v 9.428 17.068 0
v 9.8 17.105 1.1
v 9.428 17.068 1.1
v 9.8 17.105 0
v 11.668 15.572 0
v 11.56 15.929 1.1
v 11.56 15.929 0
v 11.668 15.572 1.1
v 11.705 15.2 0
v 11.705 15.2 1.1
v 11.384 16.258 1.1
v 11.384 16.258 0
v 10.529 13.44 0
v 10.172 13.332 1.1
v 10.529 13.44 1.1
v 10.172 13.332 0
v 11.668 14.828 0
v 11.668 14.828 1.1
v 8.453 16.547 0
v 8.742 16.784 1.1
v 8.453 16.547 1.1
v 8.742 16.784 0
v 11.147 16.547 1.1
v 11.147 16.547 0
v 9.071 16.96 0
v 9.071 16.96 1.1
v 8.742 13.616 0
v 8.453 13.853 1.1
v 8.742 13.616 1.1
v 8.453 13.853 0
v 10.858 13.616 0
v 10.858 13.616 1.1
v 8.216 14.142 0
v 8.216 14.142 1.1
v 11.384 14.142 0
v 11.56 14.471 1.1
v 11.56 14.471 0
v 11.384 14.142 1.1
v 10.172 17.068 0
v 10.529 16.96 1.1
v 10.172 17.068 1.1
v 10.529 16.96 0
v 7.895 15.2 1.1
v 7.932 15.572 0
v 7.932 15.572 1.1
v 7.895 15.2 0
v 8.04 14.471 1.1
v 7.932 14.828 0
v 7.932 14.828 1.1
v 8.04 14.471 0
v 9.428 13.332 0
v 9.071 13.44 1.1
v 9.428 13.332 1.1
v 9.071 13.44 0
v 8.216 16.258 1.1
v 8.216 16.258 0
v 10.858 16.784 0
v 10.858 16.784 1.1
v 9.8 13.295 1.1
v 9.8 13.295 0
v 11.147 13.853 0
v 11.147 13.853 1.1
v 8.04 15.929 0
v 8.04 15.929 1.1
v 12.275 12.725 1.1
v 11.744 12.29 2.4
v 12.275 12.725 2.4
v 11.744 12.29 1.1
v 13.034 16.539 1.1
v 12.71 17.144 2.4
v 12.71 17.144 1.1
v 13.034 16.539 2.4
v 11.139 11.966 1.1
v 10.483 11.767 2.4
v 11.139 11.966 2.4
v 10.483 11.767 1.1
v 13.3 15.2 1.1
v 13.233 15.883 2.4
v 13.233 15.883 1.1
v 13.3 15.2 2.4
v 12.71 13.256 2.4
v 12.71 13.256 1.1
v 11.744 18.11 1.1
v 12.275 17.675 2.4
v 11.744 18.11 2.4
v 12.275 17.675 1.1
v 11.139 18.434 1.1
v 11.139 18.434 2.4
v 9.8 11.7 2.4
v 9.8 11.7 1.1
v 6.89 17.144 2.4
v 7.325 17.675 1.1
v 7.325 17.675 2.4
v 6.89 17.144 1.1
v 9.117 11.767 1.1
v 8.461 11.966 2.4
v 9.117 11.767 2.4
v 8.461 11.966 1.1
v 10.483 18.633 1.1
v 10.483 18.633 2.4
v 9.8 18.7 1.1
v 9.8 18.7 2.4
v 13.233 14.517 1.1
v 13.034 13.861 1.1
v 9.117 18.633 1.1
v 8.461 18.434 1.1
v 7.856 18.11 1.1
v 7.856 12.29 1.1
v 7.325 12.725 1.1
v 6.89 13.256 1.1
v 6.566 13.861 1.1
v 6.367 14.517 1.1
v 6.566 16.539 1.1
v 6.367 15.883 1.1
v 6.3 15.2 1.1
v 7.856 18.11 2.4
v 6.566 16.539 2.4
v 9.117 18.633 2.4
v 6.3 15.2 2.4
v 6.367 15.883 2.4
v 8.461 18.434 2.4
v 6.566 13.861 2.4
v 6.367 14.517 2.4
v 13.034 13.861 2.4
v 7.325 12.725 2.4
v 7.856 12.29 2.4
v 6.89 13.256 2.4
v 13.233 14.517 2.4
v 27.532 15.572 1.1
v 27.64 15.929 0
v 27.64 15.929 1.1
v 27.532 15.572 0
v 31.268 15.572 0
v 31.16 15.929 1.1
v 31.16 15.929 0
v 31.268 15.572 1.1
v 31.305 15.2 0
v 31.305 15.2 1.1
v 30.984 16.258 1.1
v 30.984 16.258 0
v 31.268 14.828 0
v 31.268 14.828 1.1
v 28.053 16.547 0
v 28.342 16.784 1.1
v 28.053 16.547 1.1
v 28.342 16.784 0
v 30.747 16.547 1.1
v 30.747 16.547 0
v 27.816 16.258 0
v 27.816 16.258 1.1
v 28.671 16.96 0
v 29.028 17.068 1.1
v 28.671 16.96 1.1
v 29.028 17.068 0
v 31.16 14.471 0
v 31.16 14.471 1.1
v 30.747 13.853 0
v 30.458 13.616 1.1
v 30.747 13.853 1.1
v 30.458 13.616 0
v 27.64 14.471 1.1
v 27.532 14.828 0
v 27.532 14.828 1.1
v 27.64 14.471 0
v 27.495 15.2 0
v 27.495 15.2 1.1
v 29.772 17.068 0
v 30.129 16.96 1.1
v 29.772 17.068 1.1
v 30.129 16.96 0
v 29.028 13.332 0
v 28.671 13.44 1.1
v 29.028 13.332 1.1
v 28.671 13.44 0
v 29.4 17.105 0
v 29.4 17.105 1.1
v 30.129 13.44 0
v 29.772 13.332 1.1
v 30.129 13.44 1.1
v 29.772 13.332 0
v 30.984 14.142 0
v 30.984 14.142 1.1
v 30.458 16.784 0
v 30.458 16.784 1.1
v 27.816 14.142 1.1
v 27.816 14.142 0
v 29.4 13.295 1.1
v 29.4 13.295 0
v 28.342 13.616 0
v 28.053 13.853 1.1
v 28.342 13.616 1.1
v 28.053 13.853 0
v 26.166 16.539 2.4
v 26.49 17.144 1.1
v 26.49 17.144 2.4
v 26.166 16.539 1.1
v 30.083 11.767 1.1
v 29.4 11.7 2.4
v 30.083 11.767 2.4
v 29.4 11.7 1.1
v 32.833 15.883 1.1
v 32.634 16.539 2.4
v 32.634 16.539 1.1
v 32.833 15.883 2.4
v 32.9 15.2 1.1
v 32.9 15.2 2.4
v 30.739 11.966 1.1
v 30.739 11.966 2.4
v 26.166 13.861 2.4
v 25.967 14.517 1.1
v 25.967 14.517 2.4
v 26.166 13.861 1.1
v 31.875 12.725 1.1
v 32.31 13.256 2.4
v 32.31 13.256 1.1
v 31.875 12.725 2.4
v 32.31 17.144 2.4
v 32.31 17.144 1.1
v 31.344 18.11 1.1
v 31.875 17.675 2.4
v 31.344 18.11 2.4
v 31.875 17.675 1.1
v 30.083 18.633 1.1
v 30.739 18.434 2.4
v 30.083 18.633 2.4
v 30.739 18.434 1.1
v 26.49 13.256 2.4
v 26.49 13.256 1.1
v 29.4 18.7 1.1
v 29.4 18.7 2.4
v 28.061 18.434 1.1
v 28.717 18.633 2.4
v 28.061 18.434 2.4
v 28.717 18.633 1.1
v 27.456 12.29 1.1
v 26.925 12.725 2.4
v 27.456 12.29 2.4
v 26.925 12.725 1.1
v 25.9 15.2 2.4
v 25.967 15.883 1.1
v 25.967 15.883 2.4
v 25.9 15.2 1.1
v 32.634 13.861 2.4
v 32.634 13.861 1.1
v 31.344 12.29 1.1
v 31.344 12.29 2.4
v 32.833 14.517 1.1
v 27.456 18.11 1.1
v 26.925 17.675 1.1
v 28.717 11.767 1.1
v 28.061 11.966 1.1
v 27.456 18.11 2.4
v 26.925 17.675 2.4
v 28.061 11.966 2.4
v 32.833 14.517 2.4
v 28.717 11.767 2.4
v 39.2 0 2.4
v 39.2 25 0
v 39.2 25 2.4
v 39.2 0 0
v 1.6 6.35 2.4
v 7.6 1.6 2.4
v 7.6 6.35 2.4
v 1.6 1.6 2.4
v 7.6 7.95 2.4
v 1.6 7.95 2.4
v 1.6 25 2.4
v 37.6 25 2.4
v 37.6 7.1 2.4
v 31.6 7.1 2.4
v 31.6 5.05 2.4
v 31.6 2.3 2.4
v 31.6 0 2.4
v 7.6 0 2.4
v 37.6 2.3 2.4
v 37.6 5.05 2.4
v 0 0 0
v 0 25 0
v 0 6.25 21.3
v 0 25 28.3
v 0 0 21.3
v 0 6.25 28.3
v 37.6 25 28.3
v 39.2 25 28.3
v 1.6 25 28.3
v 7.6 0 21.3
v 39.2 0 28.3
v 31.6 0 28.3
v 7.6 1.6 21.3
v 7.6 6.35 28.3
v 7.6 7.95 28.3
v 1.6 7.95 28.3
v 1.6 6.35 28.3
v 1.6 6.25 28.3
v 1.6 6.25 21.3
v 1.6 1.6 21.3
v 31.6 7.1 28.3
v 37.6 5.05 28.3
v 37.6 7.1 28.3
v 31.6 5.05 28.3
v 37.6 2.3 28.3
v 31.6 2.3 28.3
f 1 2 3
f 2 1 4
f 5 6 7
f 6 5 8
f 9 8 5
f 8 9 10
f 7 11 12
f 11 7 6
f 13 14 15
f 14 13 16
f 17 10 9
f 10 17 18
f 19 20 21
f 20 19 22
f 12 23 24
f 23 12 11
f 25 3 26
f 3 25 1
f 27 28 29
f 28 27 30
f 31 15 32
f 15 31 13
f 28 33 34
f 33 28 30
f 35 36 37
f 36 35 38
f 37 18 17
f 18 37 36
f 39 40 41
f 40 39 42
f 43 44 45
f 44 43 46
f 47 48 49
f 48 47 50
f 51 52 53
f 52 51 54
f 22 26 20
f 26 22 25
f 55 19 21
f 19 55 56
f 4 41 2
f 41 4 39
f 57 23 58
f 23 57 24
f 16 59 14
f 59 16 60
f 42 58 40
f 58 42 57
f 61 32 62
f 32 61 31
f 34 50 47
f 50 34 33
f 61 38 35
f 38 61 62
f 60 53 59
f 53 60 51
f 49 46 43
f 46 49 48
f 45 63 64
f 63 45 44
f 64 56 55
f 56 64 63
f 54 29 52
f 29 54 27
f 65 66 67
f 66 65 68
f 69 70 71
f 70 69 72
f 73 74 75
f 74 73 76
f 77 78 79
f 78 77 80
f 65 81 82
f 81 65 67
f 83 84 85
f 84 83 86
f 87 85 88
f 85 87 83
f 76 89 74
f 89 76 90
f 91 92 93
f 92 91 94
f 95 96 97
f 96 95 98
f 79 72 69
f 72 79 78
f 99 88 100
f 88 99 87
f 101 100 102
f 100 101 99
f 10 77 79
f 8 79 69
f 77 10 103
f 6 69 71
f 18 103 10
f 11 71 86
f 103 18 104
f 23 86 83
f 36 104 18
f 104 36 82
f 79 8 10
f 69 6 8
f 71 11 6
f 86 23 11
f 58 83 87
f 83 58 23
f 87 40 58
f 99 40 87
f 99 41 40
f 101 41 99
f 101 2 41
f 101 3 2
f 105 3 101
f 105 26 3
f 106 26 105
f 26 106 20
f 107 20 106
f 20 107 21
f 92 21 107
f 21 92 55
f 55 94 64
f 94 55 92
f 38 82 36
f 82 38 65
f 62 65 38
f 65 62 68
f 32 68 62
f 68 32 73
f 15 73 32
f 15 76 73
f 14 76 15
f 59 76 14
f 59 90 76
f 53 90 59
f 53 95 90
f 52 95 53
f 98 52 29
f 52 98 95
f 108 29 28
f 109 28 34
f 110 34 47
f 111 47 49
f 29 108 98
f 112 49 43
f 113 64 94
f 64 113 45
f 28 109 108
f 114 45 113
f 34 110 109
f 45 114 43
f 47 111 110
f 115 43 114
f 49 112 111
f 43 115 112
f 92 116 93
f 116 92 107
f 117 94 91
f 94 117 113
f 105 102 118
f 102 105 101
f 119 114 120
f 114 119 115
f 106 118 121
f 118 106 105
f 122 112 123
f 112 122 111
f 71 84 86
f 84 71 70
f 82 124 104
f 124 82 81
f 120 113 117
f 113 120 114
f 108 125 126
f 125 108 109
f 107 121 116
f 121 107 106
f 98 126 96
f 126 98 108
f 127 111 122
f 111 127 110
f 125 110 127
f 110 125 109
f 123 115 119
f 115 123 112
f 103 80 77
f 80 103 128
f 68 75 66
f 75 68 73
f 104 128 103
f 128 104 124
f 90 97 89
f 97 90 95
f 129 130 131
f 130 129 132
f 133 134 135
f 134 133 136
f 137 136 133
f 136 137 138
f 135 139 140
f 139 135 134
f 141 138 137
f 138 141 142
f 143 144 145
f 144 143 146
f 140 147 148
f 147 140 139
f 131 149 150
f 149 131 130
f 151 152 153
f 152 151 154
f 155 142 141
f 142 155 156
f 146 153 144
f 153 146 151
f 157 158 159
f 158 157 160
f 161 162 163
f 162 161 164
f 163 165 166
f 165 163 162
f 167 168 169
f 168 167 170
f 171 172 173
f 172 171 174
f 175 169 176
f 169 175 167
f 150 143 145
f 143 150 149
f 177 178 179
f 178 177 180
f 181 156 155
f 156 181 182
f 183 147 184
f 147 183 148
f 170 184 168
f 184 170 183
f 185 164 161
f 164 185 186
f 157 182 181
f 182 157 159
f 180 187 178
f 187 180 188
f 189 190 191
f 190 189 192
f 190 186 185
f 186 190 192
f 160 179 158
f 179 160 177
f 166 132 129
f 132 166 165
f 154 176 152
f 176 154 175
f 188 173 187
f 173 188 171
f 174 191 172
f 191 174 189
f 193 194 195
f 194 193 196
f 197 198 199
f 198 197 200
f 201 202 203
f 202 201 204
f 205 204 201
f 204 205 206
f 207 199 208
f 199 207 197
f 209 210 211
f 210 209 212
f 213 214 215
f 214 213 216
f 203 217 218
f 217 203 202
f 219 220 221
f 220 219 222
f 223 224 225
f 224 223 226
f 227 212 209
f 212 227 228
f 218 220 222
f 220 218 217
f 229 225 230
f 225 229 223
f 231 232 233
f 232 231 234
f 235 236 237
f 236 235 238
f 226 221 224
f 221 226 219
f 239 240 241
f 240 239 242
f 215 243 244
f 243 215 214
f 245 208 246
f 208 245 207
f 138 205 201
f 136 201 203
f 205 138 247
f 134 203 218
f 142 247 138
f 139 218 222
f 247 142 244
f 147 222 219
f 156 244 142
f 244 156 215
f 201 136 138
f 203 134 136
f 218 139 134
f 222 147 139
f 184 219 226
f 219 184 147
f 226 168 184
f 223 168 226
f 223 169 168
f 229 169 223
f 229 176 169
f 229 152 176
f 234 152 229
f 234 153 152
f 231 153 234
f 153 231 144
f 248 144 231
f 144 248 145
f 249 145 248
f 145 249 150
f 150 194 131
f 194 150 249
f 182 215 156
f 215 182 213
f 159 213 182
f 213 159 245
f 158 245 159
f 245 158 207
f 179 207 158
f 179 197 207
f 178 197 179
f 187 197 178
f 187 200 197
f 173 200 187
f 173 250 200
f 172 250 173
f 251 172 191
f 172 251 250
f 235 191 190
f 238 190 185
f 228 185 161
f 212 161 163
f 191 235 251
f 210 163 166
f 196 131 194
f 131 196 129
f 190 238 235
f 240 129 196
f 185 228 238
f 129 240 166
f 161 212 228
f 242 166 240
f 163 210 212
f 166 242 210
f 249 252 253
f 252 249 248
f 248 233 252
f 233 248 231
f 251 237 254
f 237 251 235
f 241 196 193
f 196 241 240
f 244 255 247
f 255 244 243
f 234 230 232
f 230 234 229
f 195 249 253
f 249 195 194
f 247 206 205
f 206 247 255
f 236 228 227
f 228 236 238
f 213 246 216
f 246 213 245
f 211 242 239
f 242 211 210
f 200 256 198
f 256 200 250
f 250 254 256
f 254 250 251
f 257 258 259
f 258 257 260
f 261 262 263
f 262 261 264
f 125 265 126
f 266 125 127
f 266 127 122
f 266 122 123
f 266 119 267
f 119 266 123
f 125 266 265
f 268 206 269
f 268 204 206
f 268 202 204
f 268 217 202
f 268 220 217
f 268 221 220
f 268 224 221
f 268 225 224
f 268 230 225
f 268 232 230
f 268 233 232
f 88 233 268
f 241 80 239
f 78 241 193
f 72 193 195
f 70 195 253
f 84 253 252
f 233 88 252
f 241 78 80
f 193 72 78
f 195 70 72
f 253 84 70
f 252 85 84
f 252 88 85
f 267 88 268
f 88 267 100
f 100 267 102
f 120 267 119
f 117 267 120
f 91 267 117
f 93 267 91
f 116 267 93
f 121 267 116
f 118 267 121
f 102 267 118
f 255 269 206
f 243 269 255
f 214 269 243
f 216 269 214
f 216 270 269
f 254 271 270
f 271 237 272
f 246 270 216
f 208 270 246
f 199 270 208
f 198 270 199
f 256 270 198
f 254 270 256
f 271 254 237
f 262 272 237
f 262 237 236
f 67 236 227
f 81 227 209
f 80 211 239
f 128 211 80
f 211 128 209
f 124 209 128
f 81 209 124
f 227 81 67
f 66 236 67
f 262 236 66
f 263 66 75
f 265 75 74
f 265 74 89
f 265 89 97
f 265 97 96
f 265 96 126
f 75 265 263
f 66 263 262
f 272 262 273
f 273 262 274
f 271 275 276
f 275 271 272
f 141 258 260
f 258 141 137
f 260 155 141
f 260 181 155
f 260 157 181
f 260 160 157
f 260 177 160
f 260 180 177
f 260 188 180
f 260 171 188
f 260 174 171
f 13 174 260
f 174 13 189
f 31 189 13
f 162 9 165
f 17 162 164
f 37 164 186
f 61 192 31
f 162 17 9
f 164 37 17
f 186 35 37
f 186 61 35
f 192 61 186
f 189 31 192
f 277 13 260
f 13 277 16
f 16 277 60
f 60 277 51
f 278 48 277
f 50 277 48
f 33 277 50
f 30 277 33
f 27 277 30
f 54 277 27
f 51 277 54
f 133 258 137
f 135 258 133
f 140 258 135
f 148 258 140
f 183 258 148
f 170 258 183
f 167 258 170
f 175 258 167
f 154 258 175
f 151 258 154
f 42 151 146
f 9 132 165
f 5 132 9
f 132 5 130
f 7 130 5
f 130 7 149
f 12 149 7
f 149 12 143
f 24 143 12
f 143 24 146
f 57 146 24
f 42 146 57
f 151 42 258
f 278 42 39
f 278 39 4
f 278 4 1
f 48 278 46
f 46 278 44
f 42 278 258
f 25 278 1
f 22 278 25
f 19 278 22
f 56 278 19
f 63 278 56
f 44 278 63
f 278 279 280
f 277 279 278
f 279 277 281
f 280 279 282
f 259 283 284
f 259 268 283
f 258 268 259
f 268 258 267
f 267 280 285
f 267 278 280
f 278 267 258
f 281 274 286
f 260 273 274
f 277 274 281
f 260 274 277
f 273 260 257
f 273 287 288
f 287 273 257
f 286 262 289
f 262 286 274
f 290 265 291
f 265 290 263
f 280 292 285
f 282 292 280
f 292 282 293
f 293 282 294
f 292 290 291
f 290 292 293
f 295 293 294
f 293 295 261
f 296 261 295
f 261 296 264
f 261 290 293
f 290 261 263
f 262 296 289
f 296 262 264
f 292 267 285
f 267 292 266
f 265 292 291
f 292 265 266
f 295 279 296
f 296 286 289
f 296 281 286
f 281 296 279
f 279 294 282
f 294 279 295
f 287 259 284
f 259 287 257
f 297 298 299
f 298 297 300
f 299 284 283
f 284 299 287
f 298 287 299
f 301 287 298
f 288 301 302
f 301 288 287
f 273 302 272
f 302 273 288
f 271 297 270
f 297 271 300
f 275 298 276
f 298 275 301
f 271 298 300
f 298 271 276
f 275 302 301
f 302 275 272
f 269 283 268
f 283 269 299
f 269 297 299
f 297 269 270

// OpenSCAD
//
// bracket thing to hold ESP wifi module on top
// 2022-12-05:  3rd try with adjusted fit
//

e = 0.1;			/* interference delta */
g = 0.25;			/* mechanical gap */
mm = 25.4;

$fn = 32;

slot_dep = 6;

slot_wid_left = 4.75;
slot_wid_right = 2.75;
slot_offset_right = 0.7;

pcb_len_x = 36;
pcb_hgt_z = 26;

wall_thk = 1.6;			/* general wall thickness */
base_thk = 2.4;

base_len_x = pcb_len_x + 2*wall_thk;
base_wid_y = 25;
base_hgt_z = pcb_hgt_z + base_thk;

hole_x1 = base_len_x / 4;
hole_x2 = hole_x1*3;
hole_y = base_wid_y-hole_x1;

hole_dia = 0.15*mm;

module hole( x, y, d1, d2, thk, head) {
     translate( [x, y, -e]) {
	  cylinder( h=thk+2*e, d=d1);
	  translate( [0, 0, head])
	       cylinder( h=thk, d=d2);
     }
}

// base with mounting holes
difference() {
     cube( [base_len_x, base_wid_y, base_thk]);
     hole( hole_x1, hole_y, 0.15*mm, 7, base_thk, base_thk/2);
     hole( hole_x2, hole_y, 0.15*mm, 7, base_thk, base_thk/2);
}

// sides
translate( [0, 0, base_thk-e]) {

     difference() {
	  cube( [wall_thk+slot_dep, base_wid_y, pcb_hgt_z]);
	  // left slot for PCB
	  translate( [wall_thk, wall_thk, -e])
	       cube( [slot_dep+e, slot_wid_left, pcb_hgt_z+2*e]);
	  // cut extra stuff away
	  translate( [wall_thk, wall_thk*2+slot_wid_left, -e])
	       cube( [slot_dep+e, base_wid_y-wall_thk*2+slot_wid_left+e, pcb_hgt_z+2*e]);
	  // cutout for reset button
	  translate( [-e, -e, pcb_hgt_z-7])
	       cube( [wall_thk+slot_dep+2*e, wall_thk+slot_wid_left, 7+e]);
     }

     translate( [base_len_x-slot_dep-wall_thk, 0, 0])
     difference() {
	  cube( [wall_thk+slot_dep, base_wid_y, pcb_hgt_z]);
	  // right slot for PCB
	  translate( [-e, wall_thk+slot_offset_right, -e])
	       cube( [slot_dep+e, slot_wid_right, pcb_hgt_z+2*e]);
	  // cut extra stuff away
	  translate( [-e, wall_thk+2*slot_wid_right, -e])
	       cube( [slot_dep+e, base_wid_y-wall_thk*2+slot_wid_right+e, pcb_hgt_z+2*e]);
     }

     
     
}
